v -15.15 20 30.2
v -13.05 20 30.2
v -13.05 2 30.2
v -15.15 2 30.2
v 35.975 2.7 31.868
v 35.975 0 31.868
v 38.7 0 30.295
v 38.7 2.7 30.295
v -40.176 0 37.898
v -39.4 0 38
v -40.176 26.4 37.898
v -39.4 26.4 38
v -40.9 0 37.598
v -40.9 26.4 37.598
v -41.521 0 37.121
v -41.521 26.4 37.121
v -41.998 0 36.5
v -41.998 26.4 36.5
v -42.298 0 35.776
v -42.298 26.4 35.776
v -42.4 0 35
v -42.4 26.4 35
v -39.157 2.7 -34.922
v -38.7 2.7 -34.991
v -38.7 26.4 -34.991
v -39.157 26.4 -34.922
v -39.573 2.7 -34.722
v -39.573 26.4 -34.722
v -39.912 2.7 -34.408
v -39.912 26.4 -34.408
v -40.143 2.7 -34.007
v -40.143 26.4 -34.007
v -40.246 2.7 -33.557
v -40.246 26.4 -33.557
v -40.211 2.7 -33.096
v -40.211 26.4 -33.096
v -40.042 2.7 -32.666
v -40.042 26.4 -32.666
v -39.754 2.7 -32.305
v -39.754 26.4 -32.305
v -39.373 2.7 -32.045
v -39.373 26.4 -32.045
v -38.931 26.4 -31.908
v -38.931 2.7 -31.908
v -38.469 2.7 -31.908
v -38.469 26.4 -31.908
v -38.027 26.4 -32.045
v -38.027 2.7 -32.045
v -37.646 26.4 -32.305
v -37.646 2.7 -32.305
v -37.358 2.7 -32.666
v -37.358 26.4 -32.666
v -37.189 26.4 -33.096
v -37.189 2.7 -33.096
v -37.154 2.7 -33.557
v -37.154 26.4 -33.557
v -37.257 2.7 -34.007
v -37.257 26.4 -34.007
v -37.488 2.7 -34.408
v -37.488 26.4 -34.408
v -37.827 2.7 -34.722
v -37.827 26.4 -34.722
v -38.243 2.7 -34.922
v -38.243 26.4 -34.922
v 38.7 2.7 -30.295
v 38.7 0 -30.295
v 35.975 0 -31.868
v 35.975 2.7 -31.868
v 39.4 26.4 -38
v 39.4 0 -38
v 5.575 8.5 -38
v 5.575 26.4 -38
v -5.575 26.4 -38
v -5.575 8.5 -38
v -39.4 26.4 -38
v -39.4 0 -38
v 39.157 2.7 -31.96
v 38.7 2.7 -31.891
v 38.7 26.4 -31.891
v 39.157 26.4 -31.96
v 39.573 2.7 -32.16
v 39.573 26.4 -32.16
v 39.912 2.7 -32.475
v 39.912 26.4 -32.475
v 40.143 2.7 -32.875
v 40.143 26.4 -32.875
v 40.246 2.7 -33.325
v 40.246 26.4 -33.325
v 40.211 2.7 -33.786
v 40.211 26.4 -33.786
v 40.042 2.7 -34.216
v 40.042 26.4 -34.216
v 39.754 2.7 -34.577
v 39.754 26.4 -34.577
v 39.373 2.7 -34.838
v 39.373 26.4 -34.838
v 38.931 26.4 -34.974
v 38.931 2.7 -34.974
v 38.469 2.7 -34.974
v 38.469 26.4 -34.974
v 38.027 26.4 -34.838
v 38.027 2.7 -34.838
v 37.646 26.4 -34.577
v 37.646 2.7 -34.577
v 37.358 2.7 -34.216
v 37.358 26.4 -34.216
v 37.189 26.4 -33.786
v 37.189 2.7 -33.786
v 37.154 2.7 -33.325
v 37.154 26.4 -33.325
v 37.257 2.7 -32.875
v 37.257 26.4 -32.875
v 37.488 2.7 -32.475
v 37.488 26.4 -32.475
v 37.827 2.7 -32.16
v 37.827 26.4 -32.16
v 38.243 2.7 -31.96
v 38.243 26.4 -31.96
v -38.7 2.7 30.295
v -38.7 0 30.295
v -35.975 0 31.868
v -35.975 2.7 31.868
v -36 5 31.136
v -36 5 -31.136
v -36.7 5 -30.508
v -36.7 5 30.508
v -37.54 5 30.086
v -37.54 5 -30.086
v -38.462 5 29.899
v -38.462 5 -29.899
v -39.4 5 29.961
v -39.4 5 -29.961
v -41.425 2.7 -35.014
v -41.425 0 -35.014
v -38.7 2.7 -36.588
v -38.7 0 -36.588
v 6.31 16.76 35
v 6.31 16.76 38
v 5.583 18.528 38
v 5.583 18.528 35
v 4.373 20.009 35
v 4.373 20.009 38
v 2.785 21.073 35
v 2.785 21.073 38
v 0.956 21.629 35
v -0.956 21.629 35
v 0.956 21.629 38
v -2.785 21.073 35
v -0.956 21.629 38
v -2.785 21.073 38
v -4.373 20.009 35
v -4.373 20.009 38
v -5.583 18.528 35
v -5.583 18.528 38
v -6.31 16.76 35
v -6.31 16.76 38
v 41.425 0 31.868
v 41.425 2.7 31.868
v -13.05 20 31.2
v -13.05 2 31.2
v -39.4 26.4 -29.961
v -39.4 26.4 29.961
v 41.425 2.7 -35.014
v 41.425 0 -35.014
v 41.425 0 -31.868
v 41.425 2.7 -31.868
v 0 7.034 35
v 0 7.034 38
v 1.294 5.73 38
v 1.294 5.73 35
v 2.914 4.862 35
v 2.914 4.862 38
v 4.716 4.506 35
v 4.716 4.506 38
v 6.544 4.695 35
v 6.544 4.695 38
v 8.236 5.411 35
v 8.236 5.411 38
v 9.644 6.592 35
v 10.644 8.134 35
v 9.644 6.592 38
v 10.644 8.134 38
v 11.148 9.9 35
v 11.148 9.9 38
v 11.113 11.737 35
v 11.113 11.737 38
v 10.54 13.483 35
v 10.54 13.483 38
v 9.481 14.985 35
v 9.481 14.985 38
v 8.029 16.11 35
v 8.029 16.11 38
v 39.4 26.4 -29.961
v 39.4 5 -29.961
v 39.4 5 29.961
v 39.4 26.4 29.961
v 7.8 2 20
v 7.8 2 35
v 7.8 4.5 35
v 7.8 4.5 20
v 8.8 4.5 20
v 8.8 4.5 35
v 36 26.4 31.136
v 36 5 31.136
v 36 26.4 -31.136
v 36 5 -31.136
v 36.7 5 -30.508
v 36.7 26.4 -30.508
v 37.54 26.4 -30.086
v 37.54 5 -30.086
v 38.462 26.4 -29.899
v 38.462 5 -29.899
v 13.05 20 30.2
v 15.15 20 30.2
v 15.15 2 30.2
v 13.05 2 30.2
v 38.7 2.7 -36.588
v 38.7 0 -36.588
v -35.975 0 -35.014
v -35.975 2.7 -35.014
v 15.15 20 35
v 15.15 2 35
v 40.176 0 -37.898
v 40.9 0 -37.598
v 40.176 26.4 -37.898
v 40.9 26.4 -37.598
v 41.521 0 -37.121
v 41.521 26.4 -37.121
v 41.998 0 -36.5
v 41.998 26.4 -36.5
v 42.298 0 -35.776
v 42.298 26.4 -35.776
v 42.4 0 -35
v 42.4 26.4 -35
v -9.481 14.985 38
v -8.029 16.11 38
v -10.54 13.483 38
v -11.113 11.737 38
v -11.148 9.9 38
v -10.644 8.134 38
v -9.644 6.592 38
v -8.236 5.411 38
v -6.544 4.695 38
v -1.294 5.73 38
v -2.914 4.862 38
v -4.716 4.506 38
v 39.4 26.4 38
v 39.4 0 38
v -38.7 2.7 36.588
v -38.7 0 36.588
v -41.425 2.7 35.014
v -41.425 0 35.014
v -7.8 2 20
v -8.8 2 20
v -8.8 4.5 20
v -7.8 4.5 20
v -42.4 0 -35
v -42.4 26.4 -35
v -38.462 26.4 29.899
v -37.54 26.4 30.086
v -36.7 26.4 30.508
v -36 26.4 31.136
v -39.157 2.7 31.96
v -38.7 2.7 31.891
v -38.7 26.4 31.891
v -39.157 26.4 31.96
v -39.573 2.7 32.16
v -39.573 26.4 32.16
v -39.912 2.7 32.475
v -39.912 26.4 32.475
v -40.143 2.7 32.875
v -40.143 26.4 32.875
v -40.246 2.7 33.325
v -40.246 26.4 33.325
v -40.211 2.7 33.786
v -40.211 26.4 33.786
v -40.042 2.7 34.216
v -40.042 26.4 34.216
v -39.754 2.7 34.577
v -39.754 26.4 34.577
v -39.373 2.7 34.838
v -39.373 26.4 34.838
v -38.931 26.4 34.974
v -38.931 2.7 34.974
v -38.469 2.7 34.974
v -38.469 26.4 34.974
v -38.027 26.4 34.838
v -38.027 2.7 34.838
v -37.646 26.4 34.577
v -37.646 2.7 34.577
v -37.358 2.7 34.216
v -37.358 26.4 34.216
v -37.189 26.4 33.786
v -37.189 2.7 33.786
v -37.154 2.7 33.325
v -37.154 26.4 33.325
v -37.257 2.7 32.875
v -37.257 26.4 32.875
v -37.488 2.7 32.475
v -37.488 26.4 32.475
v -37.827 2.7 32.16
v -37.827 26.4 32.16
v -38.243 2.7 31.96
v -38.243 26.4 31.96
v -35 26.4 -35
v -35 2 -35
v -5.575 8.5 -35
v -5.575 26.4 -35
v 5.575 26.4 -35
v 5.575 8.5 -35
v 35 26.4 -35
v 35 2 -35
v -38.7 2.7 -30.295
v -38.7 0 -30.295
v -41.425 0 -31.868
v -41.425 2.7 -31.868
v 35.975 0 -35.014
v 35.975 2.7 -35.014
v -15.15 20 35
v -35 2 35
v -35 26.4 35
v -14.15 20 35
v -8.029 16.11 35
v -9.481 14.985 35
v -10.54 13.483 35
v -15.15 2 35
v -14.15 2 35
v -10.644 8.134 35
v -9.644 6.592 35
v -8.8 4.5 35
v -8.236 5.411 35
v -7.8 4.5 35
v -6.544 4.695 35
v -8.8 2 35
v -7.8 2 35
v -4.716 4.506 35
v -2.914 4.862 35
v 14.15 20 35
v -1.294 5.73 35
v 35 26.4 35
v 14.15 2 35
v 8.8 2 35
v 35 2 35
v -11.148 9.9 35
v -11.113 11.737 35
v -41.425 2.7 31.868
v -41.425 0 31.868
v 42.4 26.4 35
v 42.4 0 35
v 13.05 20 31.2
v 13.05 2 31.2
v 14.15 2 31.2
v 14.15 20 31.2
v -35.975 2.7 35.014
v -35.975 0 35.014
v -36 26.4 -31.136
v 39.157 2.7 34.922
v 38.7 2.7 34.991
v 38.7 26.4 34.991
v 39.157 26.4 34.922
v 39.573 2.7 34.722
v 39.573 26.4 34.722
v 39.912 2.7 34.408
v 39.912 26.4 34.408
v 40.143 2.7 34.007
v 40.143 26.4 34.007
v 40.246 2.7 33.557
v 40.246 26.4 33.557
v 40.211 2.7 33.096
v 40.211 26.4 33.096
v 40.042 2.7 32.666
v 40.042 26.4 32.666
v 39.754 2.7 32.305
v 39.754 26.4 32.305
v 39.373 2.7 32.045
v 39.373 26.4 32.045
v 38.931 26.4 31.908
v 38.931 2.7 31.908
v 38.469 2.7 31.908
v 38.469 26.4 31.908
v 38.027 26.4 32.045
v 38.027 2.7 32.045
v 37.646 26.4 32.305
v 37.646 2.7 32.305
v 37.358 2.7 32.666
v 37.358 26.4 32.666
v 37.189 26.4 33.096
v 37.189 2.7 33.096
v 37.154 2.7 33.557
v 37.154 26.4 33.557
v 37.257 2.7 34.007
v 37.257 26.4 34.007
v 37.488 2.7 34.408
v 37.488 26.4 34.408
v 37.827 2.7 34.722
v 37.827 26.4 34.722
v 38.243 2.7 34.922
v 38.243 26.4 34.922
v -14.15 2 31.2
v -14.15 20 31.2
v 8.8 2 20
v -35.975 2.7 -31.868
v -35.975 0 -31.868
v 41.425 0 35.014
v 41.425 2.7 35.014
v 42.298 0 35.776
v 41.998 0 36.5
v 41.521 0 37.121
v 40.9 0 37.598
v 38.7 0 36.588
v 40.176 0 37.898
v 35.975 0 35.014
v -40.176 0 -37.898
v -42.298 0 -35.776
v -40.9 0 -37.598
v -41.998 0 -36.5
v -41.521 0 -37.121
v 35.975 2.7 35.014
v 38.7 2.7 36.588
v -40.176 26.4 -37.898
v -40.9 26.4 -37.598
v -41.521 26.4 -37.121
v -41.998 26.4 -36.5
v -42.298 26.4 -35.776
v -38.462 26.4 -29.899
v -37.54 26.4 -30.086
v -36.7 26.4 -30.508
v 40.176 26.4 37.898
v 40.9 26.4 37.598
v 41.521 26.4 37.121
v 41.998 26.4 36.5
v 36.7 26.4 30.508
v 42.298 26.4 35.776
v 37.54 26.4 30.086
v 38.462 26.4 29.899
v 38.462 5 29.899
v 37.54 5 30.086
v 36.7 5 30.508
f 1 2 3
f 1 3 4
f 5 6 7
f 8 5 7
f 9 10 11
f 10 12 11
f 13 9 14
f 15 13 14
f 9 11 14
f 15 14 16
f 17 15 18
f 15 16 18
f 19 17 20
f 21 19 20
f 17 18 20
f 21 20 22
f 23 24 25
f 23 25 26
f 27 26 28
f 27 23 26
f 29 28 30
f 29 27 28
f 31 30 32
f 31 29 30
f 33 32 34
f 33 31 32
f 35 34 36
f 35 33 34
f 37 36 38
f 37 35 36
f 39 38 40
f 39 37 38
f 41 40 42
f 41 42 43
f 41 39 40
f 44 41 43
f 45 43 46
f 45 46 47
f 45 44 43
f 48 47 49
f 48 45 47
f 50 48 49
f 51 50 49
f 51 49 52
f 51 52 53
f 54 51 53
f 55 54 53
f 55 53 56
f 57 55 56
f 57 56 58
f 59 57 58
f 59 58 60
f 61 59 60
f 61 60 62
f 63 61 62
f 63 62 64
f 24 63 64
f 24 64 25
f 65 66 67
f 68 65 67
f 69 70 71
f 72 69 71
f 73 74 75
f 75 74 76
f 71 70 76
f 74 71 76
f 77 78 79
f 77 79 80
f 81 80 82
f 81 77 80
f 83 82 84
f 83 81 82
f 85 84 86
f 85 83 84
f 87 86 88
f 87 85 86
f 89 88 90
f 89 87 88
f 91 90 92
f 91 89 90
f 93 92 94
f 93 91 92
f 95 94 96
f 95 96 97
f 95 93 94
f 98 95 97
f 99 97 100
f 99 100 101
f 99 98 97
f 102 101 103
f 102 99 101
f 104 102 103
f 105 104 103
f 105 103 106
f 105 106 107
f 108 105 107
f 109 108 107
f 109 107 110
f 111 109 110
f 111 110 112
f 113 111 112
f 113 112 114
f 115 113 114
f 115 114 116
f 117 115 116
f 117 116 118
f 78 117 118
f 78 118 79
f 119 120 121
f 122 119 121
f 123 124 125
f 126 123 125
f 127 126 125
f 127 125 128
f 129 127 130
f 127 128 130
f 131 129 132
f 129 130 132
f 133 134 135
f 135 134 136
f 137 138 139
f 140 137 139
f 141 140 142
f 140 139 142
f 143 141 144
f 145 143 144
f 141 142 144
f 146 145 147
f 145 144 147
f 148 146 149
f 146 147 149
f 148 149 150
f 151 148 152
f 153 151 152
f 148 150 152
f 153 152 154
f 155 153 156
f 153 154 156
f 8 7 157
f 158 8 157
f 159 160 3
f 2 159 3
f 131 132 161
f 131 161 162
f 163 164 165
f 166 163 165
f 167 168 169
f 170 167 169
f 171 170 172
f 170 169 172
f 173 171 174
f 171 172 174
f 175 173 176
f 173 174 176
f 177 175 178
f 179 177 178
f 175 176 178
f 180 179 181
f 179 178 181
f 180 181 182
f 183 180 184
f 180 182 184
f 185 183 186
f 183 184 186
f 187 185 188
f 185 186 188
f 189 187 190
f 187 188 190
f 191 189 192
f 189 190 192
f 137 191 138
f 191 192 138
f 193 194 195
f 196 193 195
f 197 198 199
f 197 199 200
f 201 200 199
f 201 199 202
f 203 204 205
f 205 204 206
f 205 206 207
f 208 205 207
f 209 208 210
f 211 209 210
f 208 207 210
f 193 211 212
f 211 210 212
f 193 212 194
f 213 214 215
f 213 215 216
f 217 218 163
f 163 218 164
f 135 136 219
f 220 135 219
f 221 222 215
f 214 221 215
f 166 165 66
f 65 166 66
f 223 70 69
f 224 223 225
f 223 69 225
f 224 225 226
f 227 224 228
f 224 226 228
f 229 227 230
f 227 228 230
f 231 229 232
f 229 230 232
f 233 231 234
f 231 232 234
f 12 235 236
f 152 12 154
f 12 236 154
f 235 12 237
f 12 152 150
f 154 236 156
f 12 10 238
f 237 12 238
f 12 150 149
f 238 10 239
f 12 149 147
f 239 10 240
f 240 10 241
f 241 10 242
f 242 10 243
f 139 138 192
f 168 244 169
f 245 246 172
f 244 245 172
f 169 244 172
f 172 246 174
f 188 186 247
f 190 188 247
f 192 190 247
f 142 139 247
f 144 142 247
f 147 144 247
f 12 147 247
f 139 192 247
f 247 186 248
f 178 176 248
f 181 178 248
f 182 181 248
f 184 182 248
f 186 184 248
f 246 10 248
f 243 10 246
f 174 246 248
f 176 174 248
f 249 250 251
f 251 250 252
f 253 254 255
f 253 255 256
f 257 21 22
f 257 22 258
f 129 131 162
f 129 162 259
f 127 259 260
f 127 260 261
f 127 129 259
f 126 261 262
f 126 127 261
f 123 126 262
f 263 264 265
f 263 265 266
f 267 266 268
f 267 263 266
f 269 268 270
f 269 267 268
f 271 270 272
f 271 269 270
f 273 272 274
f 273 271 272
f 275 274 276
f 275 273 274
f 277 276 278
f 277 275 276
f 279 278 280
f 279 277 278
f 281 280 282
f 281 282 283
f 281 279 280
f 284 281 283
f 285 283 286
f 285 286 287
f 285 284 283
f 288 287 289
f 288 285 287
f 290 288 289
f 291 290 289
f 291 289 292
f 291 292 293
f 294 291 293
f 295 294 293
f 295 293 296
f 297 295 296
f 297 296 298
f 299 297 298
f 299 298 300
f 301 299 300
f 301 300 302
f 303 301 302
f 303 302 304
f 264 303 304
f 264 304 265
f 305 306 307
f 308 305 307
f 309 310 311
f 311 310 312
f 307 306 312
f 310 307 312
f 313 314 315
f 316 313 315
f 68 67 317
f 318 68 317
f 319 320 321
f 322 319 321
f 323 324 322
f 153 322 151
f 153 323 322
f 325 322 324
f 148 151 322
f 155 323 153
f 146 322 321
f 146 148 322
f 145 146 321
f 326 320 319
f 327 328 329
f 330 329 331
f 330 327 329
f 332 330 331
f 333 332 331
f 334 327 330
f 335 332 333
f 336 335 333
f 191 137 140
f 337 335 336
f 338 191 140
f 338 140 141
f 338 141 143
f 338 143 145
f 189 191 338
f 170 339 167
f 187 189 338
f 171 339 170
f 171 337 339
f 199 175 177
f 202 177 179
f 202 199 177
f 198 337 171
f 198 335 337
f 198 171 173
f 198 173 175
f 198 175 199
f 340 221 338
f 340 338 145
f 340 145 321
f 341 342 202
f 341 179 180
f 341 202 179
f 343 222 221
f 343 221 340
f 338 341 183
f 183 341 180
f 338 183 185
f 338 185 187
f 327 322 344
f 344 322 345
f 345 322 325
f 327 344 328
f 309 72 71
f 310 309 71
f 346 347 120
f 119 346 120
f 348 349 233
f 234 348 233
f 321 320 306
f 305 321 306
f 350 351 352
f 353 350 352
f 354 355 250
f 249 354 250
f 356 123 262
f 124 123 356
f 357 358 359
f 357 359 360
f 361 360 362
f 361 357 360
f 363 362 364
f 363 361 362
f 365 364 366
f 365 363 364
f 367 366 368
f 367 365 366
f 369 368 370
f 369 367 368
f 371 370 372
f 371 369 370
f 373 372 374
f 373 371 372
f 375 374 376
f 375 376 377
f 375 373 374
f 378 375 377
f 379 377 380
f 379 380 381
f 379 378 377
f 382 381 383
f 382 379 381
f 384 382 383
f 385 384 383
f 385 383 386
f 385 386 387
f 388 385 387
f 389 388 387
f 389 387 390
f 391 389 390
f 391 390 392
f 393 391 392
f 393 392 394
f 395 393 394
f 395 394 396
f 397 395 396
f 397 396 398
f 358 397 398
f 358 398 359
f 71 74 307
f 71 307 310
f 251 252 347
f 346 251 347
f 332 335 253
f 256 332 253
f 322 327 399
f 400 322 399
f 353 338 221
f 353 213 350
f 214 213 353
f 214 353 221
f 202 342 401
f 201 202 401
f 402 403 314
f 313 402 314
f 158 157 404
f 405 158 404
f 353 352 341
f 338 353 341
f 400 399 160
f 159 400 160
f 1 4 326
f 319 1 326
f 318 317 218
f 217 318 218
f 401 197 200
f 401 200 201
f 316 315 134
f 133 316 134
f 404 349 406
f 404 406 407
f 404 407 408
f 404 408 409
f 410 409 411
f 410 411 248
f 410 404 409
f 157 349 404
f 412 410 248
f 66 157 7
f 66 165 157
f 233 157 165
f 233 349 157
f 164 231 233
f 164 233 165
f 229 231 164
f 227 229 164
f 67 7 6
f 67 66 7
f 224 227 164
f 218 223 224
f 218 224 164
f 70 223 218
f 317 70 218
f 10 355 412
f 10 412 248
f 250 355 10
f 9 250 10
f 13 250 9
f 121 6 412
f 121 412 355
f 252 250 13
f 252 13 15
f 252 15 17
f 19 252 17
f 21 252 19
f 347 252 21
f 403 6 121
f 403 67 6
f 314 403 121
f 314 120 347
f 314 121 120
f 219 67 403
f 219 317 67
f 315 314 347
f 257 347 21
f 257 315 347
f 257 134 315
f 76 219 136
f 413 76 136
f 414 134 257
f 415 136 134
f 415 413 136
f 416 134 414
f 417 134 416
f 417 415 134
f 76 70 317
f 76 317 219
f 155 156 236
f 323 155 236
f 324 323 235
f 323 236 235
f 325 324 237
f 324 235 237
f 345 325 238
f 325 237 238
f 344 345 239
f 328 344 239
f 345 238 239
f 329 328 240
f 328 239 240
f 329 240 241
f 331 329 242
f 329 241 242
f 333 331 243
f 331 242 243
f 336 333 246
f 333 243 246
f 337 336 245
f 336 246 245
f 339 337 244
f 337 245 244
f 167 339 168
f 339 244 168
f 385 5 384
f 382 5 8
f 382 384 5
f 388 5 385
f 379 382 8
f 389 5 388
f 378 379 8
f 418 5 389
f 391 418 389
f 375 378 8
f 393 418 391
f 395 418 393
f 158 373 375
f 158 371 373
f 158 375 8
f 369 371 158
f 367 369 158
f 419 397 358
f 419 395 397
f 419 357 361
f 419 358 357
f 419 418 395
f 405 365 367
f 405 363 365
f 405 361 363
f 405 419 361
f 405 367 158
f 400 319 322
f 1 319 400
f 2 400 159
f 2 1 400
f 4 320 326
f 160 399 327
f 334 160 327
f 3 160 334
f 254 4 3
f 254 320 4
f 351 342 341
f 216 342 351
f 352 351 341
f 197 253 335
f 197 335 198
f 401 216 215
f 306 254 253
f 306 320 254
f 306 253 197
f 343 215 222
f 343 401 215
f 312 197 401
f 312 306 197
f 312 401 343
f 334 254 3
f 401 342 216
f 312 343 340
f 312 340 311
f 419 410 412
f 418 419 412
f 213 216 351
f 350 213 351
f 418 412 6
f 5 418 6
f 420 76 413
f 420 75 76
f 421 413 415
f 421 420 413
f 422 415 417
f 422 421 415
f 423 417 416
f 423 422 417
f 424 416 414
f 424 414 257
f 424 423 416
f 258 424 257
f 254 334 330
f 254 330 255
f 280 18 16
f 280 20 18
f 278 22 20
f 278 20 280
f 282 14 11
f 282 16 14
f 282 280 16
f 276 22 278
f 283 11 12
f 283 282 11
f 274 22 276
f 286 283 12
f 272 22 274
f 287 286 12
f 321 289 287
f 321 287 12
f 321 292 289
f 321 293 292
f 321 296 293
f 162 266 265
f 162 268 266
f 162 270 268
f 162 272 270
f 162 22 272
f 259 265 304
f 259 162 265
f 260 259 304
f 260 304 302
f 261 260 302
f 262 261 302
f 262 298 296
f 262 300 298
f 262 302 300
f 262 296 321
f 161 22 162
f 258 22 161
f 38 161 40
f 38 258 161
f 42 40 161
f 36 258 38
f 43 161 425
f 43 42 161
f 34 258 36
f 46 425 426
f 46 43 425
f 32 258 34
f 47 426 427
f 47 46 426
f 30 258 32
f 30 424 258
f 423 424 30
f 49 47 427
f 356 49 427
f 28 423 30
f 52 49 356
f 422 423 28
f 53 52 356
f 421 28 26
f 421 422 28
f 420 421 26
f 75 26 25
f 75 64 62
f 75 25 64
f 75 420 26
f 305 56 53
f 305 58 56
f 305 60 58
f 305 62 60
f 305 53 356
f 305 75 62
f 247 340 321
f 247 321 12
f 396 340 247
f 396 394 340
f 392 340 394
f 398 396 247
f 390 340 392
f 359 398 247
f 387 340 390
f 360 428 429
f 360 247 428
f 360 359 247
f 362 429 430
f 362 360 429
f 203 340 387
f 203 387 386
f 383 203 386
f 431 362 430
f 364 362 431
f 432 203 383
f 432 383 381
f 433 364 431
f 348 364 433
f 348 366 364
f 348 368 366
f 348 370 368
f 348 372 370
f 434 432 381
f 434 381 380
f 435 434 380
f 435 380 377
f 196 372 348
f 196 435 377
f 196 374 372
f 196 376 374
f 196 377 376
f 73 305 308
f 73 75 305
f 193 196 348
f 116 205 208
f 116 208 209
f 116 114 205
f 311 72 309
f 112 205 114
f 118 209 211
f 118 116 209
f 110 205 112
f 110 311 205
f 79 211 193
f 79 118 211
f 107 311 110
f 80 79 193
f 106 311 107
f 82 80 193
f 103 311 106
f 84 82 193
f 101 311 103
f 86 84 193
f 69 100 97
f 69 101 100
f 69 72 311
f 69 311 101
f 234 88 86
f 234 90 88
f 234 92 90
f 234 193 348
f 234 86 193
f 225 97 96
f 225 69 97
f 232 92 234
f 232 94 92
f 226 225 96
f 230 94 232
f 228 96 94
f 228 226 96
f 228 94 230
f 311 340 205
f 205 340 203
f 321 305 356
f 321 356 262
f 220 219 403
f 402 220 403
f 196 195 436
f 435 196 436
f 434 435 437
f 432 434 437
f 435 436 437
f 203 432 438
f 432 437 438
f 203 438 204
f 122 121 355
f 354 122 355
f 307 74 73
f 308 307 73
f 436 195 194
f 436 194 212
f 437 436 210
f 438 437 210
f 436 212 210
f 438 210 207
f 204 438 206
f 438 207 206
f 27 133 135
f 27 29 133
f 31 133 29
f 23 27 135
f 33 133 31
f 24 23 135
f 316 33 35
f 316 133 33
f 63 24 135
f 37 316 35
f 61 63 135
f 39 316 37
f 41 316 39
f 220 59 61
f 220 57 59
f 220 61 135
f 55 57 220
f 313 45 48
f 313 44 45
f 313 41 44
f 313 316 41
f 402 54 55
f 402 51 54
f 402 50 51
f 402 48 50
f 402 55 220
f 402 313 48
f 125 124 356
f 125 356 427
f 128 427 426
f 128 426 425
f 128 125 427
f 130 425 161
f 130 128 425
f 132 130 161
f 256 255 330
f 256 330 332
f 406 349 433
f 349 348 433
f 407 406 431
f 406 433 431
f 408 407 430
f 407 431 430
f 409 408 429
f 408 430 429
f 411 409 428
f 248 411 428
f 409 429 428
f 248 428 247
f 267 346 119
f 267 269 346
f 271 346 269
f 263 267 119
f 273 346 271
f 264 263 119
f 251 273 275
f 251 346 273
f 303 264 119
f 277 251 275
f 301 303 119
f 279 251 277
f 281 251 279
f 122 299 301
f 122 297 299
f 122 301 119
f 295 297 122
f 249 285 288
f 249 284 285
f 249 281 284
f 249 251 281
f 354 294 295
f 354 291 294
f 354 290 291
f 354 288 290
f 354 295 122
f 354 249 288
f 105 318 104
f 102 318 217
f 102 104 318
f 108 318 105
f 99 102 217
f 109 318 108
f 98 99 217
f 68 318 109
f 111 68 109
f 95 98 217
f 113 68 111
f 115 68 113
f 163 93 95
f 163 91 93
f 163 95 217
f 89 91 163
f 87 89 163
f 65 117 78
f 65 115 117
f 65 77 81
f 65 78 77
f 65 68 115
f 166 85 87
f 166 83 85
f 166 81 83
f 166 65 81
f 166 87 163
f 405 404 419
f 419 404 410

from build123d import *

# Parameters (mm, degrees)
SKETCH2_W            = 70
SKETCH2_H            = 70
BOSS_EXTRUDE1_DEPTH  = 2
BOSS_EXTRUDE2_DEPTH  = 18
SKETCH3_3_W          = 1
SKETCH3_3_H          = 15
BOSS_EXTRUDE3_DEPTH  = 2.5
SKETCH4_W            = 72
SKETCH4_H            = 76
SKETCH4_W_2          = 70
SKETCH4_H_2          = 70
BOSS_EXTRUDE4_DEPTH  = 26.4
SKETCH12_R           = 1.55
BOSS_EXTRUDE10_DEPTH = 26.4
BOSS_EXTRUDE11_DEPTH = 5
SKETCH1_R            = 1.18
SKETCH1_R_2          = 1.6
CUT_EXTRUDE1_DEPTH   = 25
FILLET1_R            = 3
CUT_EXTRUDE4_DEPTH   = 2.7
CUT_EXTRUDE5_DEPTH   = 10


with BuildPart() as part:
    # Sketch2 → Boss-Extrude1 (new body)
    with BuildSketch(Plane(origin=(0, 0, 0), x_dir=(1, 0, 0), z_dir=(0, 1, 0))):
        Rectangle(SKETCH2_W, SKETCH2_H)
    extrude(amount=BOSS_EXTRUDE1_DEPTH)

    # Sketch3 → Boss-Extrude2 (add)
    with BuildSketch(Plane(origin=(0, 2, 0), x_dir=(1, 0, 0), z_dir=(0, 1, 0))):
        Polygon((13.05, -31.2), (14.15, -31.2), (14.15, -35), (15.15, -35), (15.15, -30.2), (13.05, -30.2), align=None)
        Polygon((-15.15, -35), (-14.15, -35), (-14.15, -31.2), (-13.05, -31.2), (-13.05, -30.2), (-15.15, -30.2), align=None)
    extrude(amount=BOSS_EXTRUDE2_DEPTH)

    # Sketch3<3> → Boss-Extrude3 (add)
    with BuildSketch(Plane(origin=(0, 2, 0), x_dir=(1, 0, 0), z_dir=(0, 1, 0))):
        with Locations((-8.3, -27.5)):
            Rectangle(SKETCH3_3_W, SKETCH3_3_H)
        with Locations((8.3, -27.5)):
            Rectangle(SKETCH3_3_W, SKETCH3_3_H)
    extrude(amount=BOSS_EXTRUDE3_DEPTH)

    # Sketch4 → Boss-Extrude4 (add)
    with BuildSketch(Plane(origin=(0, 0, 0), x_dir=(1, 0, 0), z_dir=(0, 1, 0))):
        Rectangle(SKETCH4_W, SKETCH4_H)
        Rectangle(SKETCH4_W_2, SKETCH4_H_2, mode=Mode.SUBTRACT)
    extrude(amount=BOSS_EXTRUDE4_DEPTH)

    # Sketch12 → Boss-Extrude10 (add)
    # profile 1 of 2: a face of its own
    with BuildSketch(Plane(origin=(0, 0, 0), x_dir=(1, 0, 0), z_dir=(0, 1, 0))):
        with BuildLine():
            Line((36, -38), (42.4, -38))
            Line((42.4, -38), (42.4, 38))
            Line((42.4, 38), (36, 38))
            Line((36, 38), (36, 35.746040388))
            ThreePointArc((36, 35.746040388), (35.639428233, 31.642432378), (39.4, 29.960852562))
            Line((39.4, 29.960852562), (39.4, -29.960852562))
            ThreePointArc((39.4, -29.960852562), (35.639428233, -31.642432378), (36, -35.746040388))
            Line((36, -35.746040388), (36, -38))
        make_face()
        with Locations(Location((38.7, -33.441154273, 0), (0, 0, 270))):
            Circle(SKETCH12_R, mode=Mode.SUBTRACT)
        with Locations(Location((38.7, 33.441154273, 0), (0, 0, 270))):
            Circle(SKETCH12_R, mode=Mode.SUBTRACT)
    # profile 2 of 2: a face of its own
    with BuildSketch(Plane(origin=(0, 0, 0), x_dir=(1, 0, 0), z_dir=(0, 1, 0))):
        with BuildLine():
            Line((-36, 38), (-36, 35.746040388))
            ThreePointArc((-36, 35.746040388), (-35.639428233, 31.642432378), (-39.4, 29.960852562))
            Line((-39.4, 29.960852562), (-39.4, -29.960852562))
            ThreePointArc((-39.4, -29.960852562), (-35.639428233, -31.642432378), (-36, -35.746040388))
            Line((-36, -35.746040388), (-36, -38))
            Line((-36, -38), (-42.4, -38))
            Line((-42.4, -38), (-42.4, 38))
            Line((-42.4, 38), (-36, 38))
        make_face()
        with Locations(Location((-38.7, 33.441154273, 0), (0, 0, 90))):
            Circle(SKETCH12_R, mode=Mode.SUBTRACT)
        with Locations(Location((-38.7, -33.441154273, 0), (0, 0, 90))):
            Circle(SKETCH12_R, mode=Mode.SUBTRACT)
    extrude(amount=BOSS_EXTRUDE10_DEPTH)

    # Sketch13 → Boss-Extrude11 (add)
    with BuildSketch(Plane(origin=(0, 0, 0), x_dir=(1, 0, 0), z_dir=(0, 1, 0))):
        with BuildLine():
            Line((39.4, 29.960852562), (39.4, -29.960852562))
            ThreePointArc((39.4, -29.960852562), (37.540086013, -30.085994136), (36, -31.136268159))
            Line((36, -31.136268159), (36, 31.136268159))
            ThreePointArc((36, 31.136268159), (37.540086013, 30.085994136), (39.4, 29.960852562))
        make_face()
        with BuildLine():
            Line((-39.4, -29.960852562), (-39.4, 29.960852562))
            ThreePointArc((-39.4, 29.960852562), (-37.540086013, 30.085994136), (-36, 31.136268159))
            Line((-36, 31.136268159), (-36, -31.136268159))
            ThreePointArc((-36, -31.136268159), (-37.540086013, -30.085994136), (-39.4, -29.960852562))
        make_face()
    extrude(amount=BOSS_EXTRUDE11_DEPTH)

    # Sketch1 → Cut-Extrude1 (cut)
    # profile 1 of 5: a face of its own
    with BuildSketch(Plane.XY.offset(38)):
        with BuildLine():
            ThreePointArc((6.310018649, 16.760020721), (0, 21.7), (-6.310018649, 16.760020721))
            ThreePointArc((-6.310018649, 16.760020721), (-10.201264735, 7.325560023), (0, 7.033939444))
            ThreePointArc((0, 7.033939444), (10.201264735, 7.325560023), (6.310018649, 16.760020721))
        make_face()
        with BuildLine():
            ThreePointArc((4.487784147, 14.868649052), (0, 19.7), (-4.487784147, 14.868649052))
            ThreePointArc((-4.487784147, 14.868649052), (-8.121835414, 7.890348127), (-0.800613643, 10.771792937))
            ThreePointArc((-0.800613643, 10.771792937), (0, 10.7), (0.800613643, 10.771792937))
            ThreePointArc((0.800613643, 10.771792937), (8.121835414, 7.890348127), (4.487784147, 14.868649052))
        make_face(mode=Mode.SUBTRACT)
    # profile 2 of 5: a face of its own
    with BuildSketch(Plane.XY.offset(38)):
        with BuildLine():
            ThreePointArc((0.800613643, 10.771792937), (8.121835414, 7.890348127), (4.487784147, 14.868649052))
            ThreePointArc((4.487784147, 14.868649052), (0, 19.7), (-4.487784147, 14.868649052))
            ThreePointArc((-4.487784147, 14.868649052), (-8.121835414, 7.890348127), (-0.800613643, 10.771792937))
            ThreePointArc((-0.800613643, 10.771792937), (0, 10.7), (0.800613643, 10.771792937))
        make_face()
        with Locations((-5, 10.7)):
            Circle(SKETCH1_R, mode=Mode.SUBTRACT)
        with Locations((5, 10.7)):
            Circle(SKETCH1_R, mode=Mode.SUBTRACT)
        with Locations((0, 15.2)):
            Circle(SKETCH1_R_2, mode=Mode.SUBTRACT)
    # profile 3 of 5: a face of its own
    with BuildSketch(Plane.XY.offset(38)):
        with Locations((0, 15.2)):
            Circle(SKETCH1_R_2)
    # profile 4 of 5: a face of its own
    with BuildSketch(Plane.XY.offset(38)):
        with Locations((5, 10.7)):
            Circle(SKETCH1_R)
    # profile 5 of 5: a face of its own
    with BuildSketch(Plane.XY.offset(38)):
        with Locations((-5, 10.7)):
            Circle(SKETCH1_R)
    extrude(amount=-CUT_EXTRUDE1_DEPTH, mode=Mode.SUBTRACT)

    # Fillet1
    fillet1_edges = [part.edges().sort_by_distance(p)[0] for p in [
        (42.4, 13.2, -38),
        (42.4, 13.2, 38),
        (-42.4, 13.2, 38),
        (-42.4, 13.2, -38),
    ]]
    fillet(fillet1_edges, radius=FILLET1_R)

    # Sketch14 → Cut-Extrude4 (cut)
    with BuildSketch(Plane.XZ):
        Polygon((-41.425, 31.86787479), (-38.7, 30.294595306), (-35.975, 31.86787479), (-35.975, 35.014433757), (-38.7, 36.58771324), (-41.425, 35.014433757), align=None)
        Polygon((41.425, 31.86787479), (41.425, 35.014433757), (38.7, 36.58771324), (35.975, 35.014433757), (35.975, 31.86787479), (38.7, 30.294595306), align=None)
        Polygon((41.425, -35.014433757), (41.425, -31.86787479), (38.7, -30.294595306), (35.975, -31.86787479), (35.975, -35.014433757), (38.7, -36.58771324), align=None)
        Polygon((-35.975, -35.014433757), (-35.975, -31.86787479), (-38.7, -30.294595306), (-41.425, -31.86787479), (-41.425, -35.014433757), (-38.7, -36.58771324), align=None)
    extrude(amount=-CUT_EXTRUDE4_DEPTH, mode=Mode.SUBTRACT)

    # Sketch15 → Cut-Extrude5 (cut)
    with BuildSketch(Plane(origin=(0, 0, -38), x_dir=(-1, 0, 0), z_dir=(0, 0, -1))):
        Polygon((-5.575, 14), (-5.575, 26.4), (5.575, 26.4), (5.575, 14), (5.575, 8.5), (-5.575, 8.5), align=None)
    extrude(amount=-CUT_EXTRUDE5_DEPTH, mode=Mode.SUBTRACT)


solid = part.part
